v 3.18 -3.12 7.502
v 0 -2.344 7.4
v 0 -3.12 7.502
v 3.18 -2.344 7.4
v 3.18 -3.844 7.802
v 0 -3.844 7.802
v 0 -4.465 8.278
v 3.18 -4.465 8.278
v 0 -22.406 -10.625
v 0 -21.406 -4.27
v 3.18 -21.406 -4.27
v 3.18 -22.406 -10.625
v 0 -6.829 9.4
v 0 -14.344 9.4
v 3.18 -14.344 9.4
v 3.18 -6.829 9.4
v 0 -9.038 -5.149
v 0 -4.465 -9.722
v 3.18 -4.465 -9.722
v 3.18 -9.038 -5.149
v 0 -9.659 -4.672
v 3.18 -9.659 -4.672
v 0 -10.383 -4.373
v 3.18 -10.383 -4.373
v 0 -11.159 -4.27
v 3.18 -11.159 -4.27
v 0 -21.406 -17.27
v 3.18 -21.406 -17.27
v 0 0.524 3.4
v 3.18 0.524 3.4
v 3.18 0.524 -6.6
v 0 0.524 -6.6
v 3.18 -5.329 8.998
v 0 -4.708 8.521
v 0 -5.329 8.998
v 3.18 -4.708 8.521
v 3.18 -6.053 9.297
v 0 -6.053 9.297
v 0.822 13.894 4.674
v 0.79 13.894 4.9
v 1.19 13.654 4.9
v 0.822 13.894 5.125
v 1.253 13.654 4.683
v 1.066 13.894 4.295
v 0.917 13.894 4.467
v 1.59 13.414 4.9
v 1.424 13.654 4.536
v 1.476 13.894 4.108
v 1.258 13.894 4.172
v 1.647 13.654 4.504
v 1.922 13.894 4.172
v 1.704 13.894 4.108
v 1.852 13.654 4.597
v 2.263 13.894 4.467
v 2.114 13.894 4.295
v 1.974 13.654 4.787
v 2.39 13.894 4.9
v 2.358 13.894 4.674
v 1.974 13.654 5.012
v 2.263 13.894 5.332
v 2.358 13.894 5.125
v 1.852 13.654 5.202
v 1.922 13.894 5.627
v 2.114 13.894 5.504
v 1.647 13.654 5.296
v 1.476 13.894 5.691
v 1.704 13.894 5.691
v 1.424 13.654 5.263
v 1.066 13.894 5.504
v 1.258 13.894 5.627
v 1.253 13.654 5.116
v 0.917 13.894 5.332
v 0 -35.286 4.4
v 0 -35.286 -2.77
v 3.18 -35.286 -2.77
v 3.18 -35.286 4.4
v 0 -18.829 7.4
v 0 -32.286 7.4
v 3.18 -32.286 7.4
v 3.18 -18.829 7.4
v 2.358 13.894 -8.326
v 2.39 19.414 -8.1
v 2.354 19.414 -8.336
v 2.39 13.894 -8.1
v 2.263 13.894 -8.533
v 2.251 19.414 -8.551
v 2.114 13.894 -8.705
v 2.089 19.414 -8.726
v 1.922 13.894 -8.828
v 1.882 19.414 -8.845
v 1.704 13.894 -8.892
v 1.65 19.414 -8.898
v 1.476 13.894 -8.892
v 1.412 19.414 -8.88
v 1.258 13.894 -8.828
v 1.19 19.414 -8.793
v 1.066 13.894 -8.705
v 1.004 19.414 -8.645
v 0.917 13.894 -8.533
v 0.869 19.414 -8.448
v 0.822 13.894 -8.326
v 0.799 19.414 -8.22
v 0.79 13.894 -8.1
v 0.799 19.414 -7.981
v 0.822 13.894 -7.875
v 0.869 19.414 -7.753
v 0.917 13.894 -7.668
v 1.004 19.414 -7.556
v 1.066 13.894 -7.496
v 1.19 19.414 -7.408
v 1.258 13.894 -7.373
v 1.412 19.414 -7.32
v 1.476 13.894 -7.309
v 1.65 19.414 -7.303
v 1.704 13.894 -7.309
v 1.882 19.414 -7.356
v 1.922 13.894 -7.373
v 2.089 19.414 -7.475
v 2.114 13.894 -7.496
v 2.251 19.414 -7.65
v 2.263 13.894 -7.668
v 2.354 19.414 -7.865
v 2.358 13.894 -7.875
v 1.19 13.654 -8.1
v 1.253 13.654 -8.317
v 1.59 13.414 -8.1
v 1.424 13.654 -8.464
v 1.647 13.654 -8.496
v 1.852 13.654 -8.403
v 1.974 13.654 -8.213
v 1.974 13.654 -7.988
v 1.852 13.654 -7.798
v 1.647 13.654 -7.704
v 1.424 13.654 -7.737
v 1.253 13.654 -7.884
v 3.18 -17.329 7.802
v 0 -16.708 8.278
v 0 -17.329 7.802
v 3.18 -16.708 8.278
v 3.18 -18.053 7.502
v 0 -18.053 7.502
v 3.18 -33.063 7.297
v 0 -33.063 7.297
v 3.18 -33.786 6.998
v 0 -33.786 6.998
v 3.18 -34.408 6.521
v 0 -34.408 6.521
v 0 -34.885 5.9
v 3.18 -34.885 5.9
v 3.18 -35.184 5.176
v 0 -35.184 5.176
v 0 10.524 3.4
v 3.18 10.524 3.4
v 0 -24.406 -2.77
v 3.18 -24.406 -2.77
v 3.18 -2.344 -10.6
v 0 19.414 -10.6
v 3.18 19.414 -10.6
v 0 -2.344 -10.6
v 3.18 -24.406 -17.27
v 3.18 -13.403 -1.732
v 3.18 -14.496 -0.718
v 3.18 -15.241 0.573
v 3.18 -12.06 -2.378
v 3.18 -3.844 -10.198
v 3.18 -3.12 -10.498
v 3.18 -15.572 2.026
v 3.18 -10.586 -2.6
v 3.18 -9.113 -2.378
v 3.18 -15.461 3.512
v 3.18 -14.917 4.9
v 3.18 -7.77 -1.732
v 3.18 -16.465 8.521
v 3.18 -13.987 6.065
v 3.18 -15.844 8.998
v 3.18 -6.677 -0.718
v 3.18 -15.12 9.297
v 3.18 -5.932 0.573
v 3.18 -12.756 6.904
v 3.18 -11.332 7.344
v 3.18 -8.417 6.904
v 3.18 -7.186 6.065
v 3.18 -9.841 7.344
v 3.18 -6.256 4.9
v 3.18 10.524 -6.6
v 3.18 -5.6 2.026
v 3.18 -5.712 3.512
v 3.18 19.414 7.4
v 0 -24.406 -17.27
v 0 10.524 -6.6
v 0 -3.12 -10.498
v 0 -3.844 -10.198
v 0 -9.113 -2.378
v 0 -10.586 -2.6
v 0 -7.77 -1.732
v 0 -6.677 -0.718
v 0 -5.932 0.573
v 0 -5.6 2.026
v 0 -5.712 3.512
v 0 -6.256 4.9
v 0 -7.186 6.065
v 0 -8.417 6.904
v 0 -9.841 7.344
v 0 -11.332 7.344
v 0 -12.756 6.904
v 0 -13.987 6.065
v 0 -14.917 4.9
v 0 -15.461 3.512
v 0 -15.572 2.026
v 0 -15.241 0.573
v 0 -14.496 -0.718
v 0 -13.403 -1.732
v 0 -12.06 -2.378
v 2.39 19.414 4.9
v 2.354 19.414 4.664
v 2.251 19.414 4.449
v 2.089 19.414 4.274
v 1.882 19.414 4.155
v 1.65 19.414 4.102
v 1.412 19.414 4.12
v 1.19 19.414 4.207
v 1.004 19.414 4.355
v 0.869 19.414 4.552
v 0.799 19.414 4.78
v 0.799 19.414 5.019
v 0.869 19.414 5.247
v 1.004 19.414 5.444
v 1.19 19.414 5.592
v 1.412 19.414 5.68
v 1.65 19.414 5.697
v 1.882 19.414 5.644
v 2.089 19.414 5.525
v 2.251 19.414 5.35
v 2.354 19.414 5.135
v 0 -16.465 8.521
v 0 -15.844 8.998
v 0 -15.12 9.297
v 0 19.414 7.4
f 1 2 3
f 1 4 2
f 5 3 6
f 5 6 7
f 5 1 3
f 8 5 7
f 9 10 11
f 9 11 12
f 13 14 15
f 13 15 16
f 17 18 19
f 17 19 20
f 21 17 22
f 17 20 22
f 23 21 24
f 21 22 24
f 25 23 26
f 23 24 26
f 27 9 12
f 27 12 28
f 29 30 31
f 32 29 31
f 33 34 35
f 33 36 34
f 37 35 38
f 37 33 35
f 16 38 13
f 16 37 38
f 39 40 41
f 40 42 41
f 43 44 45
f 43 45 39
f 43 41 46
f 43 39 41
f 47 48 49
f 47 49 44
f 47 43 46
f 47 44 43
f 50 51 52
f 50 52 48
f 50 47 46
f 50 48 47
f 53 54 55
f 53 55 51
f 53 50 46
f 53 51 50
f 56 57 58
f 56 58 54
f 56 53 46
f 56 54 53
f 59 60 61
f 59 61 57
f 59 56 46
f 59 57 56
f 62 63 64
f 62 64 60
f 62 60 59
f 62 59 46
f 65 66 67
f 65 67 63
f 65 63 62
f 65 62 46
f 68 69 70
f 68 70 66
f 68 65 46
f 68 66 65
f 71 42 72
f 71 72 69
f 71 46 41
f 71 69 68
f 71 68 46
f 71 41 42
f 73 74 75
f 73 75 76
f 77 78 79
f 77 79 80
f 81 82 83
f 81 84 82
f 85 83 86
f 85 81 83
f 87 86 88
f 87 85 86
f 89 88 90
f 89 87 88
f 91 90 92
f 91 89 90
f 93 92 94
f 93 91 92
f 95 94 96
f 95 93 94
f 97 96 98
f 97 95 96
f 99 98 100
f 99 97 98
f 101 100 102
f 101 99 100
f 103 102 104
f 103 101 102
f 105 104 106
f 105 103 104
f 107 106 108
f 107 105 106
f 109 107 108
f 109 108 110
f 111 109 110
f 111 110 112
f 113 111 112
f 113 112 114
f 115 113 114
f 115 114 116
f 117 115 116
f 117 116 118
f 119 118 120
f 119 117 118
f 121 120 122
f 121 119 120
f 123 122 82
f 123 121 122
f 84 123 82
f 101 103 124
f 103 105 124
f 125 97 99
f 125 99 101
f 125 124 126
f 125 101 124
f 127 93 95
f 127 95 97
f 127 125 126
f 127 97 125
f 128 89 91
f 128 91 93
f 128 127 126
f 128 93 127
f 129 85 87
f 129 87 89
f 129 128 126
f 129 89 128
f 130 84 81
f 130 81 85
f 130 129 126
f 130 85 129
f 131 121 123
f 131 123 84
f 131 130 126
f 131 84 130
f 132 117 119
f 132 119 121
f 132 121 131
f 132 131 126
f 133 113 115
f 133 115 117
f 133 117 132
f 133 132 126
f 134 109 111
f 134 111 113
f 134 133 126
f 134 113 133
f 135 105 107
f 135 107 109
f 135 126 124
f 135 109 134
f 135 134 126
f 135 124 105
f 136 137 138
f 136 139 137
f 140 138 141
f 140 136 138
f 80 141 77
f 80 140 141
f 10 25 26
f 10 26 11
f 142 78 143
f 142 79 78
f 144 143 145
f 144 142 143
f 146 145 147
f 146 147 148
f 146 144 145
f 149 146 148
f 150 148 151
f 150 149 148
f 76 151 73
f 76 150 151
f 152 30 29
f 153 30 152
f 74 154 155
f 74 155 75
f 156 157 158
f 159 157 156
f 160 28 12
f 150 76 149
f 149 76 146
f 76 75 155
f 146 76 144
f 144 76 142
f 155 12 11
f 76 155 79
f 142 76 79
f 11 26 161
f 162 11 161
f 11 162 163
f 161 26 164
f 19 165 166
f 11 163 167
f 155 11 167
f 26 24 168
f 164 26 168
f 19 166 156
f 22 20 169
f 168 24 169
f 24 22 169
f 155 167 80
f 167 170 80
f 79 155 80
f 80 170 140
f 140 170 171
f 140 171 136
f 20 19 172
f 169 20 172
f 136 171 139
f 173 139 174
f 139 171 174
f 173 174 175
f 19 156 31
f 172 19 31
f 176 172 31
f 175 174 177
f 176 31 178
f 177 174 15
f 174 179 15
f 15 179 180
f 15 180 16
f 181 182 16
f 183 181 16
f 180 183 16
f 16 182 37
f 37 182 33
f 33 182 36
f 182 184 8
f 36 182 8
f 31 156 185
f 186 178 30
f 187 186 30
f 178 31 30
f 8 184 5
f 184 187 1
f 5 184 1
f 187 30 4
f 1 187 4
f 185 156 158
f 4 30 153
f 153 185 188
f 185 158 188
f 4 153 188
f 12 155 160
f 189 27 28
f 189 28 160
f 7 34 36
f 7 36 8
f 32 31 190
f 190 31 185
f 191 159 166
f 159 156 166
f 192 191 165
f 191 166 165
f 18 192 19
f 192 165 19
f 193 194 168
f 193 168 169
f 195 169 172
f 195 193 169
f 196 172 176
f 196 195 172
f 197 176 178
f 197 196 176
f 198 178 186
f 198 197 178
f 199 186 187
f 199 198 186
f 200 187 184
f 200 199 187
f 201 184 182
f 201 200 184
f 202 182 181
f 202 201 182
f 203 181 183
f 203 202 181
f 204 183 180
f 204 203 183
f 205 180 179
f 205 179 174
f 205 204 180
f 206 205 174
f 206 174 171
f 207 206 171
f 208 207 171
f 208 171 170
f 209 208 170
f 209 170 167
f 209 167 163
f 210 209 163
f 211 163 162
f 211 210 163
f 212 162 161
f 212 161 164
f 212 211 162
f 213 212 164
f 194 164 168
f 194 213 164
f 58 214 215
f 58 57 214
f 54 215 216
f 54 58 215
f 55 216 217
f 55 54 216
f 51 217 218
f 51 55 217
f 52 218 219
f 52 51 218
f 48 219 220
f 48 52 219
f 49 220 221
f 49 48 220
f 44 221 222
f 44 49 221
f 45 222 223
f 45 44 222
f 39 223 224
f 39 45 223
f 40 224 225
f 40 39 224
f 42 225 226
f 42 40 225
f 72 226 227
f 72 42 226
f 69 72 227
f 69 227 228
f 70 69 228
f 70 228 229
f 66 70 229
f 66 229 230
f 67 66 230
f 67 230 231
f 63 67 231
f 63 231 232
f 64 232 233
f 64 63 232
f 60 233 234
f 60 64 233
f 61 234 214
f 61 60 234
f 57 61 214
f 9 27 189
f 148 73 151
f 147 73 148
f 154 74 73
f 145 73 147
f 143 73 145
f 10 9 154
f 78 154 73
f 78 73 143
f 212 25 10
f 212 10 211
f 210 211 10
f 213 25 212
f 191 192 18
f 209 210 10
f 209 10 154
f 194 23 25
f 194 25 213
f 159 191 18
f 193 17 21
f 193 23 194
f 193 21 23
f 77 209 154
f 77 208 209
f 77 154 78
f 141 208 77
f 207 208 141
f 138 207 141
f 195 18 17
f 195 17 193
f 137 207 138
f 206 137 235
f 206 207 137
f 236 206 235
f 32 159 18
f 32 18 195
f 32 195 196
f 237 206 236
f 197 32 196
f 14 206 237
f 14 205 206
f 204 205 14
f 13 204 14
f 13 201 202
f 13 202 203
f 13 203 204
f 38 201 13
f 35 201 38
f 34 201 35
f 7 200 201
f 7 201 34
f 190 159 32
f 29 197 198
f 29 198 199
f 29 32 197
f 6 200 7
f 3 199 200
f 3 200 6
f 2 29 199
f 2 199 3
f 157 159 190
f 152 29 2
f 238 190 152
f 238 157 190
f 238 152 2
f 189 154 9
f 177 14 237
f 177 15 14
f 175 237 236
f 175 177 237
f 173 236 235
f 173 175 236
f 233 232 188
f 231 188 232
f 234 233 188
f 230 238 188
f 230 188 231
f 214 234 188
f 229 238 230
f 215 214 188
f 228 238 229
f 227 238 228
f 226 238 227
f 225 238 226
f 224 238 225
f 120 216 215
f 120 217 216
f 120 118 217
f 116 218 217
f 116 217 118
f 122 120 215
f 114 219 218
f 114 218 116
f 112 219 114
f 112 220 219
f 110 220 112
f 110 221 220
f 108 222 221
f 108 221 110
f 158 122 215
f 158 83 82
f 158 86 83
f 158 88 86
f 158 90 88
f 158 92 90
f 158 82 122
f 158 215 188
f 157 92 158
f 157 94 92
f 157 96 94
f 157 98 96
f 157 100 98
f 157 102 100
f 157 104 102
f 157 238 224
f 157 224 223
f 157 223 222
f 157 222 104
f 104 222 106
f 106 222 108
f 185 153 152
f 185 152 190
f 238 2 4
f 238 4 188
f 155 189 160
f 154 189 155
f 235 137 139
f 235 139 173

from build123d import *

# Parameters (mm, degrees)
BOSS_EXTRUDE1_DEPTH       = 3.18
SKETCH2_4_OUTSIDE_W       = 40.858
SKETCH2_4_OUTSIDE_H       = 68.888
SKETCH2_4_OUTSIDE_R       = 5
CUT_EXTRUDE2_DEPTH        = 3.18
FILLET6_R                 = 3
M2X0_4_TAPPED_HOLE1_D     = 1.6
M2X0_4_TAPPED_HOLE1_DEPTH = 5.519311505
M2X0_4_TAPPED_HOLE1_TIP   = 0.480688495
SKETCH10_W                = 10
SKETCH10_H                = 10
CUT_EXTRUDE4_DEPTH        = 10


with BuildPart() as part:
    # Sketch2 → Boss-Extrude1 (new body)
    with BuildSketch(Plane(origin=(0, 0, 0), x_dir=(0, 0, -1), z_dir=(1, 0, 0))):
        Polygon((-7.39959254, 19.413571875), (10.60040746, 19.413571875), (10.60040746, -3.586428125), (4.27040746, -9.916428125), (4.27040746, -21.406428125), (10.625315102, -22.406428125), (17.27040746, -21.406428125), (17.27040746, -24.406428125), (2.77040746, -24.406428125), (2.77040746, -35.286428125), (-7.39959254, -35.286428125), (-7.39959254, -17.586428125), (-9.39959254, -15.586428125), (-9.39959254, -5.586428125), (-7.39959254, -3.586428125), align=None)
    extrude(amount=-BOSS_EXTRUDE1_DEPTH)

    # Sketch2<4> outside → Cut-Extrude2 (cut)
    # profile 1 of 3: a face of its own
    with BuildSketch(Plane(origin=(0, 0, 0), x_dir=(0, 0, -1), z_dir=(1, 0, 0))):
        with Locations((3.935, -7.936)):
            Rectangle(SKETCH2_4_OUTSIDE_W, SKETCH2_4_OUTSIDE_H)
        Polygon((-7.39959254, 19.413571875), (10.60040746, 19.413571875), (10.60040746, -3.586428125), (4.27040746, -9.916428125), (4.27040746, -21.406428125), (10.625315102, -22.406428125), (17.27040746, -21.406428125), (17.27040746, -24.406428125), (2.77040746, -24.406428125), (2.77040746, -35.286428125), (-7.39959254, -35.286428125), (-7.39959254, -17.586428125), (-9.39959254, -15.586428125), (-9.39959254, -5.586428125), (-7.39959254, -3.586428125), align=None, mode=Mode.SUBTRACT)
    # profile 2 of 3: a face of its own
    with BuildSketch(Plane(origin=(0, 0, 0), x_dir=(0, 0, -1), z_dir=(1, 0, 0))):
        with Locations((-2.39959254, -10.586428125)):
            Circle(SKETCH2_4_OUTSIDE_R)
    # profile 3 of 3: a face of its own
    with BuildSketch(Plane(origin=(0, 0, 0), x_dir=(0, 0, -1), z_dir=(1, 0, 0))):
        with Locations((1.60040746, 5.524437773)):
            Circle(SKETCH2_4_OUTSIDE_R)
    extrude(amount=-CUT_EXTRUDE2_DEPTH, mode=Mode.SUBTRACT)

    # Fillet6
    fillet6_edges = [part.edges().sort_by_distance(p)[0] for p in [
        (-1.59, -3.586428125, 7.39959254),
        (-1.59, -5.586428125, 9.39959254),
        (-1.59, -15.586428125, 9.39959254),
        (-1.59, -17.586428125, 7.39959254),
        (-1.59, -35.286428125, 7.39959254),
        (-1.59, -9.916428125, -4.27040746),
        (-1.59, -3.586428125, -10.60040746),
    ]]
    fillet(fillet6_edges, radius=FILLET6_R)

    # M2x0.4 Tapped Hole1
    with Locations(Plane(origin=(0, 19.413571875, 0), x_dir=(1, 0, 0), z_dir=(0, 1, 0))):
        with Locations((-1.59, 8.10040746), (-1.59, -4.89959254)):
            Hole(M2X0_4_TAPPED_HOLE1_D / 2, depth=M2X0_4_TAPPED_HOLE1_DEPTH)
            with Locations((0, 0, -(M2X0_4_TAPPED_HOLE1_DEPTH + M2X0_4_TAPPED_HOLE1_TIP / 2))):  # 118° drill point
                Cone(0, M2X0_4_TAPPED_HOLE1_D / 2, M2X0_4_TAPPED_HOLE1_TIP, mode=Mode.SUBTRACT)


with BuildPart() as body_2:
    # Mirror1: mirrored copy
    add(part.part.mirror(Plane.ZY))

    # Sketch10 → Cut-Extrude4 (cut)
    with BuildSketch(Plane(origin=(3.18, 0, 0), x_dir=(0, 0, -1), z_dir=(1, 0, 0))):
        with Locations((1.60040746, 5.524437773)):
            Rectangle(SKETCH10_W, SKETCH10_H)
    extrude(amount=-CUT_EXTRUDE4_DEPTH, mode=Mode.SUBTRACT)


solid = body_2.part
